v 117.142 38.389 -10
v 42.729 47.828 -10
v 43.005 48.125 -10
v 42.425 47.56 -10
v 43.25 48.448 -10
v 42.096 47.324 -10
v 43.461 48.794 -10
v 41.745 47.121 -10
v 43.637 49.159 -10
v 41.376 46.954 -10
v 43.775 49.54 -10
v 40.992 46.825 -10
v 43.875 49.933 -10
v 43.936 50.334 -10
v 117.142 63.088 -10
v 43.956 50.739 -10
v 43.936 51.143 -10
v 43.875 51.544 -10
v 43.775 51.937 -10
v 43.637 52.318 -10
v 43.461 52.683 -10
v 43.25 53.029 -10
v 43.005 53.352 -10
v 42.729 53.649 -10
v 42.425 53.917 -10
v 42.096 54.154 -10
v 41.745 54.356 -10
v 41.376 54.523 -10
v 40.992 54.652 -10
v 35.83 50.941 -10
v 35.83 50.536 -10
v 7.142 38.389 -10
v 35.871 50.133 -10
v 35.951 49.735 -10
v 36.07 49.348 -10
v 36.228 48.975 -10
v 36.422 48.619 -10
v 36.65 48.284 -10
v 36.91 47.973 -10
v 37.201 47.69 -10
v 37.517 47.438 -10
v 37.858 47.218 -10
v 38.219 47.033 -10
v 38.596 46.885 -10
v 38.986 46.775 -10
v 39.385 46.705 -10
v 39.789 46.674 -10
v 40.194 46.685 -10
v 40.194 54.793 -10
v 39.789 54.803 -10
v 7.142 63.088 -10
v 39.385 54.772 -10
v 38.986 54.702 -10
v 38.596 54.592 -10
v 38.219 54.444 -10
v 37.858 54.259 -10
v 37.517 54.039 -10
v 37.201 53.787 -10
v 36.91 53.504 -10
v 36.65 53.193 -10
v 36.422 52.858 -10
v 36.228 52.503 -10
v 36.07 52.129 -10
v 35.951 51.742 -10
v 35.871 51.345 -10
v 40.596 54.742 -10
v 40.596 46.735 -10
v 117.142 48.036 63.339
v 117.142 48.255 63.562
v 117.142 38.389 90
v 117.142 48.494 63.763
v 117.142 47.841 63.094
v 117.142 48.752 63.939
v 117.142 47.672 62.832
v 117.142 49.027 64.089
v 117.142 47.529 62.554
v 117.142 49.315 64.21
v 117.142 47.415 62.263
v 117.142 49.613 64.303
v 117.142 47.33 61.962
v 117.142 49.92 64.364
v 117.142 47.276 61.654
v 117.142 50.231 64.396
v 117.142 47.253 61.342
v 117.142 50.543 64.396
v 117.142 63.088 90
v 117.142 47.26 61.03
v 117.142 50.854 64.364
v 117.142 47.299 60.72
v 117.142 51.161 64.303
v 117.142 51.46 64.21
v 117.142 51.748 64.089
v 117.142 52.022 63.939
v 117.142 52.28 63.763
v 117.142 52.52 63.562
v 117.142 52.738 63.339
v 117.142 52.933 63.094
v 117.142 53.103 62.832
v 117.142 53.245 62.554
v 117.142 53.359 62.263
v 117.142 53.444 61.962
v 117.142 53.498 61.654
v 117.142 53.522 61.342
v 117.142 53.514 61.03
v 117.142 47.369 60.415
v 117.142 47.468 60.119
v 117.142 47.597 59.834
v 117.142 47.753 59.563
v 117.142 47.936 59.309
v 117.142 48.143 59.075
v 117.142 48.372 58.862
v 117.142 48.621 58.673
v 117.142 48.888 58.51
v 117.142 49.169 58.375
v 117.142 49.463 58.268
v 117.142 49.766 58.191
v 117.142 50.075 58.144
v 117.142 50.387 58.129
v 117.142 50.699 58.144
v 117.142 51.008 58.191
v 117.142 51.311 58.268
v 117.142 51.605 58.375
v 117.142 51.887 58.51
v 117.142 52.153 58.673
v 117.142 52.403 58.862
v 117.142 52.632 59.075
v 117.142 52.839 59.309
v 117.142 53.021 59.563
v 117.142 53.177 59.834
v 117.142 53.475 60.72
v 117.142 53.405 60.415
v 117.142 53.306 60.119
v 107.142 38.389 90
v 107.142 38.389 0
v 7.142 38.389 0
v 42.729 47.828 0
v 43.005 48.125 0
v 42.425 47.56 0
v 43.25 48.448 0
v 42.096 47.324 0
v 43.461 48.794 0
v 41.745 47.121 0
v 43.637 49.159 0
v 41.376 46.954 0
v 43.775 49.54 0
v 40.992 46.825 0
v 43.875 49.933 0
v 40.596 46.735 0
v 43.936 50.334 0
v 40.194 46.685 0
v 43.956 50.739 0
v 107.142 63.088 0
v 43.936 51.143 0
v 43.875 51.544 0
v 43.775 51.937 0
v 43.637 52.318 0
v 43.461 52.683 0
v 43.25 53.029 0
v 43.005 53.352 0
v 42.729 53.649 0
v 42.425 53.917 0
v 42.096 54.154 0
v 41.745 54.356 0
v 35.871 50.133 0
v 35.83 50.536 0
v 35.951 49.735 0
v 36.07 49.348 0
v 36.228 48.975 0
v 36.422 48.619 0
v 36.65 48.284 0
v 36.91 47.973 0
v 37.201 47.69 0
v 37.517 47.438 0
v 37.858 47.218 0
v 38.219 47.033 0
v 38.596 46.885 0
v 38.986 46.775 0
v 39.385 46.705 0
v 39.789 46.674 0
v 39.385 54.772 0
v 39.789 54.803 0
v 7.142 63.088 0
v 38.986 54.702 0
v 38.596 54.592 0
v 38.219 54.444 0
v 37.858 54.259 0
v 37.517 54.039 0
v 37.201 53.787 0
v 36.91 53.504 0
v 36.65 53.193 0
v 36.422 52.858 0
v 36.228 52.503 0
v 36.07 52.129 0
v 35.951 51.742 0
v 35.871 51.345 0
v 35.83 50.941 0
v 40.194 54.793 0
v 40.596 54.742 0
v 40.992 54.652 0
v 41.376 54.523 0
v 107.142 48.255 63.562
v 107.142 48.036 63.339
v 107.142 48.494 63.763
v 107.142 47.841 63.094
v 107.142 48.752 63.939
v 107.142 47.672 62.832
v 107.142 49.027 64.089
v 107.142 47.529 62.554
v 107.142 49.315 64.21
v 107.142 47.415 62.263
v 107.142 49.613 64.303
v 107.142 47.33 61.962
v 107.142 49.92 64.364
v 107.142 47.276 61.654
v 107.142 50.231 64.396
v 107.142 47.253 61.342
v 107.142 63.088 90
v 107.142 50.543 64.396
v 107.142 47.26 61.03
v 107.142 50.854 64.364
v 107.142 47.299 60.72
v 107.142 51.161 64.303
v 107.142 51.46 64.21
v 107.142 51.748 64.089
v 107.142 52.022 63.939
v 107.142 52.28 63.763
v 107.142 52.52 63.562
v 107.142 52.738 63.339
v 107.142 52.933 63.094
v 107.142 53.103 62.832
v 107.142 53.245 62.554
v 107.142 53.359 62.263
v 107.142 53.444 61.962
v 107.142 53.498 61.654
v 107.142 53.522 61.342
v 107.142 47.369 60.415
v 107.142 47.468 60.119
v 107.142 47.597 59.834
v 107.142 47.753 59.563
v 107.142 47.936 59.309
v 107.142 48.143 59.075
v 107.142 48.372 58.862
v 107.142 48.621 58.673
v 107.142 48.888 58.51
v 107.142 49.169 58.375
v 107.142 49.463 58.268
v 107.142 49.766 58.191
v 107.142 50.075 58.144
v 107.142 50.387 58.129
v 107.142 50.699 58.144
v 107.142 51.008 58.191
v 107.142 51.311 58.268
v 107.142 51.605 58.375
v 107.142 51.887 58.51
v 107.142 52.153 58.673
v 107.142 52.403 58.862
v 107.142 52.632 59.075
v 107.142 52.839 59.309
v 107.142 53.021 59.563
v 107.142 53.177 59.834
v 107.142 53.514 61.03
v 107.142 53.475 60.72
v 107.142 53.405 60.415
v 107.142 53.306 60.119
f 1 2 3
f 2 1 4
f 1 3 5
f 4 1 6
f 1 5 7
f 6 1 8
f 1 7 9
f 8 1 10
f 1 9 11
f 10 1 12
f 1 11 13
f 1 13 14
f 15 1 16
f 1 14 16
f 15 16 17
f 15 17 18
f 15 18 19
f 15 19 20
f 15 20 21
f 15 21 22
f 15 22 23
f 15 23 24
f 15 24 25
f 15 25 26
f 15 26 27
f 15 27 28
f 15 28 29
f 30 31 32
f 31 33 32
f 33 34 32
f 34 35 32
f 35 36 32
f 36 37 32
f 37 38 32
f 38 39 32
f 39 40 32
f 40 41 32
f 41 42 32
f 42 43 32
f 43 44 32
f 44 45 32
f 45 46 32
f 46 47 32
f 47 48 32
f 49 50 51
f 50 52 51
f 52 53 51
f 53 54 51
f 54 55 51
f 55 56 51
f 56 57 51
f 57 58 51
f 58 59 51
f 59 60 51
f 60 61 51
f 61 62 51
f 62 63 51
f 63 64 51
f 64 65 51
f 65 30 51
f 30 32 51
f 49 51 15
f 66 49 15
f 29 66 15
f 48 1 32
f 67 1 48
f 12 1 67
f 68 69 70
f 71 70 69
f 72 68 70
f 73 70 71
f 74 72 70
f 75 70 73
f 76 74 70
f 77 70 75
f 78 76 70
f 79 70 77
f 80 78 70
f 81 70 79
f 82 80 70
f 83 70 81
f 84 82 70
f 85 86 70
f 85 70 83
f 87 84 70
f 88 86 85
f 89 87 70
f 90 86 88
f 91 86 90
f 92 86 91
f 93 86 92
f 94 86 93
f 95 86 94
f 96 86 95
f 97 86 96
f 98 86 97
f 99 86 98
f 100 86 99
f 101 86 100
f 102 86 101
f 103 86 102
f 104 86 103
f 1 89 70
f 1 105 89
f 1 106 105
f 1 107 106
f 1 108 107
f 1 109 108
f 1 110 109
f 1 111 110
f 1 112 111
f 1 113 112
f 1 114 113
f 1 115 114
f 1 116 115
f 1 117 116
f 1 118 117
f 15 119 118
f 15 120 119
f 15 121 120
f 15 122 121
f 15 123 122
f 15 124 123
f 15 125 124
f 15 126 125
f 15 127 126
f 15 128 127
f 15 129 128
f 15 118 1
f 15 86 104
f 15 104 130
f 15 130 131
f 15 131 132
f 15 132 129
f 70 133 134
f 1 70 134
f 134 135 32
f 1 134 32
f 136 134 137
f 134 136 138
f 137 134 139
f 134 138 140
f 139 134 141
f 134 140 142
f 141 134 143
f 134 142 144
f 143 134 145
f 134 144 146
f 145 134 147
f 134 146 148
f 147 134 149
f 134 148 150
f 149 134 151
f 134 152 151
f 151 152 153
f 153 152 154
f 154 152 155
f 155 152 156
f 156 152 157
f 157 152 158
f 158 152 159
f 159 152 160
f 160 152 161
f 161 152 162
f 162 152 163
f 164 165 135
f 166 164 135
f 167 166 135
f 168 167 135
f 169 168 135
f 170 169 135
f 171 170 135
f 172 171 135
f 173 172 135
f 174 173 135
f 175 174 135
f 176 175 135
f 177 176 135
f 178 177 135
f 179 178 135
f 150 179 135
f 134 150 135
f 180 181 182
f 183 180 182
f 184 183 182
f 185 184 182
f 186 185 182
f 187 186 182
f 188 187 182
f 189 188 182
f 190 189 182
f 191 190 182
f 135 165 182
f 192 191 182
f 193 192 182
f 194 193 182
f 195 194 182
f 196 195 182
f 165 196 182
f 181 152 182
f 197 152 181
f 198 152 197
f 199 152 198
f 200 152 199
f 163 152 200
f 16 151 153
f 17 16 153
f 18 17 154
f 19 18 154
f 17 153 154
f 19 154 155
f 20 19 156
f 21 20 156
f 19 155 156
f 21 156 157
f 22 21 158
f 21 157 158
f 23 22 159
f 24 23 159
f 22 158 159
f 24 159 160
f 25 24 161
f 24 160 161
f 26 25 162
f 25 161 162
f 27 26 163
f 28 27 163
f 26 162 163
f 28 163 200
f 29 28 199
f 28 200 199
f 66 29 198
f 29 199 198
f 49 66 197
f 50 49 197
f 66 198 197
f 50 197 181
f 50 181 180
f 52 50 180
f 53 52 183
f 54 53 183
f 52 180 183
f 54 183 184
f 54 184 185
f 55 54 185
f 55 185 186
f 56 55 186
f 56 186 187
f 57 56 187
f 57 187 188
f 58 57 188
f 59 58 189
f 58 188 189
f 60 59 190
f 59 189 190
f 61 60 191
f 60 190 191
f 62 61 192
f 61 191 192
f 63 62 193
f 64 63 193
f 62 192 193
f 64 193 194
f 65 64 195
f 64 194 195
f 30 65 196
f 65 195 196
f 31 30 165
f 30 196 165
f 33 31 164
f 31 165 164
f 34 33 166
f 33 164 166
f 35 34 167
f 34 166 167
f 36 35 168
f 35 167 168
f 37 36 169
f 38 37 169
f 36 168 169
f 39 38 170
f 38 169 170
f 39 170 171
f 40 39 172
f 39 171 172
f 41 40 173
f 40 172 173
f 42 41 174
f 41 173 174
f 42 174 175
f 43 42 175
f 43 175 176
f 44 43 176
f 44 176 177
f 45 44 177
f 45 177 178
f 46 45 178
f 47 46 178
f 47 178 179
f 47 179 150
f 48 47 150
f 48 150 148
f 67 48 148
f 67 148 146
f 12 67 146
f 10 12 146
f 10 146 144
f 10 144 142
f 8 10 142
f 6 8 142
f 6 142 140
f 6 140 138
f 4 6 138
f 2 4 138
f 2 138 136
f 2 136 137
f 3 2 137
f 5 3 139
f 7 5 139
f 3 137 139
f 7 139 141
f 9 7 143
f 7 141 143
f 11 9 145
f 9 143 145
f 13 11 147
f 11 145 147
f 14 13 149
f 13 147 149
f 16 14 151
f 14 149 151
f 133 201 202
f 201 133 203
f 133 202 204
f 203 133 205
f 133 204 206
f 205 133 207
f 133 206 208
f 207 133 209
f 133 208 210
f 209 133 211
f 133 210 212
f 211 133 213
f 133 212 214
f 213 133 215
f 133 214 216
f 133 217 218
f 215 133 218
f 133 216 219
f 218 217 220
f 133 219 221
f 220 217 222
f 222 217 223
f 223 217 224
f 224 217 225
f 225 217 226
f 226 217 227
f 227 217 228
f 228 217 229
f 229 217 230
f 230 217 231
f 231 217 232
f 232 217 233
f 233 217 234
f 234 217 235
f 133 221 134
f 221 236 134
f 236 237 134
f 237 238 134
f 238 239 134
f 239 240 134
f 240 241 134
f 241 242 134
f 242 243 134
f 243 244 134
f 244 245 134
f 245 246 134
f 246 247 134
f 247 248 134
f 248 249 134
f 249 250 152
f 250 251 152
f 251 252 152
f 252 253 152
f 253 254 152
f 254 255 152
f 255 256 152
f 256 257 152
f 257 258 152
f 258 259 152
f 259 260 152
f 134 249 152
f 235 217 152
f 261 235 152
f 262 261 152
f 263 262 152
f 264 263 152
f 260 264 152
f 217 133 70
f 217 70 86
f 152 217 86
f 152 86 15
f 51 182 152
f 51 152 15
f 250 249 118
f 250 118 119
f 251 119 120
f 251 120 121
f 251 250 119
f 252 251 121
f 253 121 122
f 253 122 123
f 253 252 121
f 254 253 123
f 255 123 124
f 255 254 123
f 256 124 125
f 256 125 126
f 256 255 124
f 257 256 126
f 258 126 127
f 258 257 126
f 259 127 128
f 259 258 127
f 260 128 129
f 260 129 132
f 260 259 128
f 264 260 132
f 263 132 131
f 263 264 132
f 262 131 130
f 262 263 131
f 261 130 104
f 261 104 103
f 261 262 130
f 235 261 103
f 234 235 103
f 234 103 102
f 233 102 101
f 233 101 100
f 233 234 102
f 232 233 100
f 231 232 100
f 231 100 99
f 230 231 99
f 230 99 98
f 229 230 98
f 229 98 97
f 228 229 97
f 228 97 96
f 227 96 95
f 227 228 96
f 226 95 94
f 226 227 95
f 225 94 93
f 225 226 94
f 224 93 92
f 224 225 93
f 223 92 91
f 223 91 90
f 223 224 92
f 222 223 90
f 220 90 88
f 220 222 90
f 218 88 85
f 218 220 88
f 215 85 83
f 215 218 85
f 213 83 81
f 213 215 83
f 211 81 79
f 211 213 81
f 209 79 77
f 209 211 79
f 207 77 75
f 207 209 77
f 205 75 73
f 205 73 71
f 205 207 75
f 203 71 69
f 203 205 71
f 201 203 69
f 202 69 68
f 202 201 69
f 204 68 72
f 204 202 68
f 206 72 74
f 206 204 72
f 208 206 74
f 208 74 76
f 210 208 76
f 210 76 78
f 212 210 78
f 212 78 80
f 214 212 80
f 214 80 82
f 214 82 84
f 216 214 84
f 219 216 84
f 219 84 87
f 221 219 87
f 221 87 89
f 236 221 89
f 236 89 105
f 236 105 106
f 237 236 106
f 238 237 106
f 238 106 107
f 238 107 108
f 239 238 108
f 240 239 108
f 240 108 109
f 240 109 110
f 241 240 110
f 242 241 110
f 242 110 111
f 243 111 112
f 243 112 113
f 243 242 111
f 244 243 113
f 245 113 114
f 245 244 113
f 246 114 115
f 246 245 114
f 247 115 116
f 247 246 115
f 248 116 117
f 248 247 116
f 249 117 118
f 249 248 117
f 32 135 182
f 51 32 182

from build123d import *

# Parameters (mm, degrees)
SKETCH_1_W      = 65.498017076
SKETCH_1_H      = 24.698375637
SKETCH_1_R      = 4.065381732
EXTRUDE_1_DEPTH = 10
SKETCH_2_W      = 34.501982924
SKETCH_2_H      = 24.698375637
EXTRUDE_2_DEPTH = 10
SKETCH_3_W      = 100
SKETCH_3_H      = 24.698375637
SKETCH_3_R      = 3.135440561
EXTRUDE_3_DEPTH = 10


with BuildPart() as part:
    # 草图1 → 凸台-拉伸1 (new body)
    with BuildSketch(Plane.XY):
        with Locations((39.890553187, 50.738604847)):
            Rectangle(SKETCH_1_W, SKETCH_1_H)
        with Locations((39.890553187, 50.738604847)):
            Circle(SKETCH_1_R, mode=Mode.SUBTRACT)
    extrude(amount=-EXTRUDE_1_DEPTH)

    # 草图2 → 凸台-拉伸2 (add)
    with BuildSketch(Plane(origin=(0, 0, -10), x_dir=(-1, 0, 0), z_dir=(0, 0, -1))):
        with Locations((-89.890553187, 50.738604847)):
            Rectangle(SKETCH_2_W, SKETCH_2_H)
    extrude(amount=-EXTRUDE_2_DEPTH)

    # 草图3 → 凸台-拉伸3 (add)
    with BuildSketch(Plane(origin=(107.141544649, 0, 0), x_dir=(0, 0, -1), z_dir=(1, 0, 0))):
        with Locations((-40, 50.738604847)):
            Rectangle(SKETCH_3_W, SKETCH_3_H)
        with Locations((-61.264027464, 50.387155503)):
            Circle(SKETCH_3_R, mode=Mode.SUBTRACT)
    extrude(amount=EXTRUDE_3_DEPTH)


solid = part.part
